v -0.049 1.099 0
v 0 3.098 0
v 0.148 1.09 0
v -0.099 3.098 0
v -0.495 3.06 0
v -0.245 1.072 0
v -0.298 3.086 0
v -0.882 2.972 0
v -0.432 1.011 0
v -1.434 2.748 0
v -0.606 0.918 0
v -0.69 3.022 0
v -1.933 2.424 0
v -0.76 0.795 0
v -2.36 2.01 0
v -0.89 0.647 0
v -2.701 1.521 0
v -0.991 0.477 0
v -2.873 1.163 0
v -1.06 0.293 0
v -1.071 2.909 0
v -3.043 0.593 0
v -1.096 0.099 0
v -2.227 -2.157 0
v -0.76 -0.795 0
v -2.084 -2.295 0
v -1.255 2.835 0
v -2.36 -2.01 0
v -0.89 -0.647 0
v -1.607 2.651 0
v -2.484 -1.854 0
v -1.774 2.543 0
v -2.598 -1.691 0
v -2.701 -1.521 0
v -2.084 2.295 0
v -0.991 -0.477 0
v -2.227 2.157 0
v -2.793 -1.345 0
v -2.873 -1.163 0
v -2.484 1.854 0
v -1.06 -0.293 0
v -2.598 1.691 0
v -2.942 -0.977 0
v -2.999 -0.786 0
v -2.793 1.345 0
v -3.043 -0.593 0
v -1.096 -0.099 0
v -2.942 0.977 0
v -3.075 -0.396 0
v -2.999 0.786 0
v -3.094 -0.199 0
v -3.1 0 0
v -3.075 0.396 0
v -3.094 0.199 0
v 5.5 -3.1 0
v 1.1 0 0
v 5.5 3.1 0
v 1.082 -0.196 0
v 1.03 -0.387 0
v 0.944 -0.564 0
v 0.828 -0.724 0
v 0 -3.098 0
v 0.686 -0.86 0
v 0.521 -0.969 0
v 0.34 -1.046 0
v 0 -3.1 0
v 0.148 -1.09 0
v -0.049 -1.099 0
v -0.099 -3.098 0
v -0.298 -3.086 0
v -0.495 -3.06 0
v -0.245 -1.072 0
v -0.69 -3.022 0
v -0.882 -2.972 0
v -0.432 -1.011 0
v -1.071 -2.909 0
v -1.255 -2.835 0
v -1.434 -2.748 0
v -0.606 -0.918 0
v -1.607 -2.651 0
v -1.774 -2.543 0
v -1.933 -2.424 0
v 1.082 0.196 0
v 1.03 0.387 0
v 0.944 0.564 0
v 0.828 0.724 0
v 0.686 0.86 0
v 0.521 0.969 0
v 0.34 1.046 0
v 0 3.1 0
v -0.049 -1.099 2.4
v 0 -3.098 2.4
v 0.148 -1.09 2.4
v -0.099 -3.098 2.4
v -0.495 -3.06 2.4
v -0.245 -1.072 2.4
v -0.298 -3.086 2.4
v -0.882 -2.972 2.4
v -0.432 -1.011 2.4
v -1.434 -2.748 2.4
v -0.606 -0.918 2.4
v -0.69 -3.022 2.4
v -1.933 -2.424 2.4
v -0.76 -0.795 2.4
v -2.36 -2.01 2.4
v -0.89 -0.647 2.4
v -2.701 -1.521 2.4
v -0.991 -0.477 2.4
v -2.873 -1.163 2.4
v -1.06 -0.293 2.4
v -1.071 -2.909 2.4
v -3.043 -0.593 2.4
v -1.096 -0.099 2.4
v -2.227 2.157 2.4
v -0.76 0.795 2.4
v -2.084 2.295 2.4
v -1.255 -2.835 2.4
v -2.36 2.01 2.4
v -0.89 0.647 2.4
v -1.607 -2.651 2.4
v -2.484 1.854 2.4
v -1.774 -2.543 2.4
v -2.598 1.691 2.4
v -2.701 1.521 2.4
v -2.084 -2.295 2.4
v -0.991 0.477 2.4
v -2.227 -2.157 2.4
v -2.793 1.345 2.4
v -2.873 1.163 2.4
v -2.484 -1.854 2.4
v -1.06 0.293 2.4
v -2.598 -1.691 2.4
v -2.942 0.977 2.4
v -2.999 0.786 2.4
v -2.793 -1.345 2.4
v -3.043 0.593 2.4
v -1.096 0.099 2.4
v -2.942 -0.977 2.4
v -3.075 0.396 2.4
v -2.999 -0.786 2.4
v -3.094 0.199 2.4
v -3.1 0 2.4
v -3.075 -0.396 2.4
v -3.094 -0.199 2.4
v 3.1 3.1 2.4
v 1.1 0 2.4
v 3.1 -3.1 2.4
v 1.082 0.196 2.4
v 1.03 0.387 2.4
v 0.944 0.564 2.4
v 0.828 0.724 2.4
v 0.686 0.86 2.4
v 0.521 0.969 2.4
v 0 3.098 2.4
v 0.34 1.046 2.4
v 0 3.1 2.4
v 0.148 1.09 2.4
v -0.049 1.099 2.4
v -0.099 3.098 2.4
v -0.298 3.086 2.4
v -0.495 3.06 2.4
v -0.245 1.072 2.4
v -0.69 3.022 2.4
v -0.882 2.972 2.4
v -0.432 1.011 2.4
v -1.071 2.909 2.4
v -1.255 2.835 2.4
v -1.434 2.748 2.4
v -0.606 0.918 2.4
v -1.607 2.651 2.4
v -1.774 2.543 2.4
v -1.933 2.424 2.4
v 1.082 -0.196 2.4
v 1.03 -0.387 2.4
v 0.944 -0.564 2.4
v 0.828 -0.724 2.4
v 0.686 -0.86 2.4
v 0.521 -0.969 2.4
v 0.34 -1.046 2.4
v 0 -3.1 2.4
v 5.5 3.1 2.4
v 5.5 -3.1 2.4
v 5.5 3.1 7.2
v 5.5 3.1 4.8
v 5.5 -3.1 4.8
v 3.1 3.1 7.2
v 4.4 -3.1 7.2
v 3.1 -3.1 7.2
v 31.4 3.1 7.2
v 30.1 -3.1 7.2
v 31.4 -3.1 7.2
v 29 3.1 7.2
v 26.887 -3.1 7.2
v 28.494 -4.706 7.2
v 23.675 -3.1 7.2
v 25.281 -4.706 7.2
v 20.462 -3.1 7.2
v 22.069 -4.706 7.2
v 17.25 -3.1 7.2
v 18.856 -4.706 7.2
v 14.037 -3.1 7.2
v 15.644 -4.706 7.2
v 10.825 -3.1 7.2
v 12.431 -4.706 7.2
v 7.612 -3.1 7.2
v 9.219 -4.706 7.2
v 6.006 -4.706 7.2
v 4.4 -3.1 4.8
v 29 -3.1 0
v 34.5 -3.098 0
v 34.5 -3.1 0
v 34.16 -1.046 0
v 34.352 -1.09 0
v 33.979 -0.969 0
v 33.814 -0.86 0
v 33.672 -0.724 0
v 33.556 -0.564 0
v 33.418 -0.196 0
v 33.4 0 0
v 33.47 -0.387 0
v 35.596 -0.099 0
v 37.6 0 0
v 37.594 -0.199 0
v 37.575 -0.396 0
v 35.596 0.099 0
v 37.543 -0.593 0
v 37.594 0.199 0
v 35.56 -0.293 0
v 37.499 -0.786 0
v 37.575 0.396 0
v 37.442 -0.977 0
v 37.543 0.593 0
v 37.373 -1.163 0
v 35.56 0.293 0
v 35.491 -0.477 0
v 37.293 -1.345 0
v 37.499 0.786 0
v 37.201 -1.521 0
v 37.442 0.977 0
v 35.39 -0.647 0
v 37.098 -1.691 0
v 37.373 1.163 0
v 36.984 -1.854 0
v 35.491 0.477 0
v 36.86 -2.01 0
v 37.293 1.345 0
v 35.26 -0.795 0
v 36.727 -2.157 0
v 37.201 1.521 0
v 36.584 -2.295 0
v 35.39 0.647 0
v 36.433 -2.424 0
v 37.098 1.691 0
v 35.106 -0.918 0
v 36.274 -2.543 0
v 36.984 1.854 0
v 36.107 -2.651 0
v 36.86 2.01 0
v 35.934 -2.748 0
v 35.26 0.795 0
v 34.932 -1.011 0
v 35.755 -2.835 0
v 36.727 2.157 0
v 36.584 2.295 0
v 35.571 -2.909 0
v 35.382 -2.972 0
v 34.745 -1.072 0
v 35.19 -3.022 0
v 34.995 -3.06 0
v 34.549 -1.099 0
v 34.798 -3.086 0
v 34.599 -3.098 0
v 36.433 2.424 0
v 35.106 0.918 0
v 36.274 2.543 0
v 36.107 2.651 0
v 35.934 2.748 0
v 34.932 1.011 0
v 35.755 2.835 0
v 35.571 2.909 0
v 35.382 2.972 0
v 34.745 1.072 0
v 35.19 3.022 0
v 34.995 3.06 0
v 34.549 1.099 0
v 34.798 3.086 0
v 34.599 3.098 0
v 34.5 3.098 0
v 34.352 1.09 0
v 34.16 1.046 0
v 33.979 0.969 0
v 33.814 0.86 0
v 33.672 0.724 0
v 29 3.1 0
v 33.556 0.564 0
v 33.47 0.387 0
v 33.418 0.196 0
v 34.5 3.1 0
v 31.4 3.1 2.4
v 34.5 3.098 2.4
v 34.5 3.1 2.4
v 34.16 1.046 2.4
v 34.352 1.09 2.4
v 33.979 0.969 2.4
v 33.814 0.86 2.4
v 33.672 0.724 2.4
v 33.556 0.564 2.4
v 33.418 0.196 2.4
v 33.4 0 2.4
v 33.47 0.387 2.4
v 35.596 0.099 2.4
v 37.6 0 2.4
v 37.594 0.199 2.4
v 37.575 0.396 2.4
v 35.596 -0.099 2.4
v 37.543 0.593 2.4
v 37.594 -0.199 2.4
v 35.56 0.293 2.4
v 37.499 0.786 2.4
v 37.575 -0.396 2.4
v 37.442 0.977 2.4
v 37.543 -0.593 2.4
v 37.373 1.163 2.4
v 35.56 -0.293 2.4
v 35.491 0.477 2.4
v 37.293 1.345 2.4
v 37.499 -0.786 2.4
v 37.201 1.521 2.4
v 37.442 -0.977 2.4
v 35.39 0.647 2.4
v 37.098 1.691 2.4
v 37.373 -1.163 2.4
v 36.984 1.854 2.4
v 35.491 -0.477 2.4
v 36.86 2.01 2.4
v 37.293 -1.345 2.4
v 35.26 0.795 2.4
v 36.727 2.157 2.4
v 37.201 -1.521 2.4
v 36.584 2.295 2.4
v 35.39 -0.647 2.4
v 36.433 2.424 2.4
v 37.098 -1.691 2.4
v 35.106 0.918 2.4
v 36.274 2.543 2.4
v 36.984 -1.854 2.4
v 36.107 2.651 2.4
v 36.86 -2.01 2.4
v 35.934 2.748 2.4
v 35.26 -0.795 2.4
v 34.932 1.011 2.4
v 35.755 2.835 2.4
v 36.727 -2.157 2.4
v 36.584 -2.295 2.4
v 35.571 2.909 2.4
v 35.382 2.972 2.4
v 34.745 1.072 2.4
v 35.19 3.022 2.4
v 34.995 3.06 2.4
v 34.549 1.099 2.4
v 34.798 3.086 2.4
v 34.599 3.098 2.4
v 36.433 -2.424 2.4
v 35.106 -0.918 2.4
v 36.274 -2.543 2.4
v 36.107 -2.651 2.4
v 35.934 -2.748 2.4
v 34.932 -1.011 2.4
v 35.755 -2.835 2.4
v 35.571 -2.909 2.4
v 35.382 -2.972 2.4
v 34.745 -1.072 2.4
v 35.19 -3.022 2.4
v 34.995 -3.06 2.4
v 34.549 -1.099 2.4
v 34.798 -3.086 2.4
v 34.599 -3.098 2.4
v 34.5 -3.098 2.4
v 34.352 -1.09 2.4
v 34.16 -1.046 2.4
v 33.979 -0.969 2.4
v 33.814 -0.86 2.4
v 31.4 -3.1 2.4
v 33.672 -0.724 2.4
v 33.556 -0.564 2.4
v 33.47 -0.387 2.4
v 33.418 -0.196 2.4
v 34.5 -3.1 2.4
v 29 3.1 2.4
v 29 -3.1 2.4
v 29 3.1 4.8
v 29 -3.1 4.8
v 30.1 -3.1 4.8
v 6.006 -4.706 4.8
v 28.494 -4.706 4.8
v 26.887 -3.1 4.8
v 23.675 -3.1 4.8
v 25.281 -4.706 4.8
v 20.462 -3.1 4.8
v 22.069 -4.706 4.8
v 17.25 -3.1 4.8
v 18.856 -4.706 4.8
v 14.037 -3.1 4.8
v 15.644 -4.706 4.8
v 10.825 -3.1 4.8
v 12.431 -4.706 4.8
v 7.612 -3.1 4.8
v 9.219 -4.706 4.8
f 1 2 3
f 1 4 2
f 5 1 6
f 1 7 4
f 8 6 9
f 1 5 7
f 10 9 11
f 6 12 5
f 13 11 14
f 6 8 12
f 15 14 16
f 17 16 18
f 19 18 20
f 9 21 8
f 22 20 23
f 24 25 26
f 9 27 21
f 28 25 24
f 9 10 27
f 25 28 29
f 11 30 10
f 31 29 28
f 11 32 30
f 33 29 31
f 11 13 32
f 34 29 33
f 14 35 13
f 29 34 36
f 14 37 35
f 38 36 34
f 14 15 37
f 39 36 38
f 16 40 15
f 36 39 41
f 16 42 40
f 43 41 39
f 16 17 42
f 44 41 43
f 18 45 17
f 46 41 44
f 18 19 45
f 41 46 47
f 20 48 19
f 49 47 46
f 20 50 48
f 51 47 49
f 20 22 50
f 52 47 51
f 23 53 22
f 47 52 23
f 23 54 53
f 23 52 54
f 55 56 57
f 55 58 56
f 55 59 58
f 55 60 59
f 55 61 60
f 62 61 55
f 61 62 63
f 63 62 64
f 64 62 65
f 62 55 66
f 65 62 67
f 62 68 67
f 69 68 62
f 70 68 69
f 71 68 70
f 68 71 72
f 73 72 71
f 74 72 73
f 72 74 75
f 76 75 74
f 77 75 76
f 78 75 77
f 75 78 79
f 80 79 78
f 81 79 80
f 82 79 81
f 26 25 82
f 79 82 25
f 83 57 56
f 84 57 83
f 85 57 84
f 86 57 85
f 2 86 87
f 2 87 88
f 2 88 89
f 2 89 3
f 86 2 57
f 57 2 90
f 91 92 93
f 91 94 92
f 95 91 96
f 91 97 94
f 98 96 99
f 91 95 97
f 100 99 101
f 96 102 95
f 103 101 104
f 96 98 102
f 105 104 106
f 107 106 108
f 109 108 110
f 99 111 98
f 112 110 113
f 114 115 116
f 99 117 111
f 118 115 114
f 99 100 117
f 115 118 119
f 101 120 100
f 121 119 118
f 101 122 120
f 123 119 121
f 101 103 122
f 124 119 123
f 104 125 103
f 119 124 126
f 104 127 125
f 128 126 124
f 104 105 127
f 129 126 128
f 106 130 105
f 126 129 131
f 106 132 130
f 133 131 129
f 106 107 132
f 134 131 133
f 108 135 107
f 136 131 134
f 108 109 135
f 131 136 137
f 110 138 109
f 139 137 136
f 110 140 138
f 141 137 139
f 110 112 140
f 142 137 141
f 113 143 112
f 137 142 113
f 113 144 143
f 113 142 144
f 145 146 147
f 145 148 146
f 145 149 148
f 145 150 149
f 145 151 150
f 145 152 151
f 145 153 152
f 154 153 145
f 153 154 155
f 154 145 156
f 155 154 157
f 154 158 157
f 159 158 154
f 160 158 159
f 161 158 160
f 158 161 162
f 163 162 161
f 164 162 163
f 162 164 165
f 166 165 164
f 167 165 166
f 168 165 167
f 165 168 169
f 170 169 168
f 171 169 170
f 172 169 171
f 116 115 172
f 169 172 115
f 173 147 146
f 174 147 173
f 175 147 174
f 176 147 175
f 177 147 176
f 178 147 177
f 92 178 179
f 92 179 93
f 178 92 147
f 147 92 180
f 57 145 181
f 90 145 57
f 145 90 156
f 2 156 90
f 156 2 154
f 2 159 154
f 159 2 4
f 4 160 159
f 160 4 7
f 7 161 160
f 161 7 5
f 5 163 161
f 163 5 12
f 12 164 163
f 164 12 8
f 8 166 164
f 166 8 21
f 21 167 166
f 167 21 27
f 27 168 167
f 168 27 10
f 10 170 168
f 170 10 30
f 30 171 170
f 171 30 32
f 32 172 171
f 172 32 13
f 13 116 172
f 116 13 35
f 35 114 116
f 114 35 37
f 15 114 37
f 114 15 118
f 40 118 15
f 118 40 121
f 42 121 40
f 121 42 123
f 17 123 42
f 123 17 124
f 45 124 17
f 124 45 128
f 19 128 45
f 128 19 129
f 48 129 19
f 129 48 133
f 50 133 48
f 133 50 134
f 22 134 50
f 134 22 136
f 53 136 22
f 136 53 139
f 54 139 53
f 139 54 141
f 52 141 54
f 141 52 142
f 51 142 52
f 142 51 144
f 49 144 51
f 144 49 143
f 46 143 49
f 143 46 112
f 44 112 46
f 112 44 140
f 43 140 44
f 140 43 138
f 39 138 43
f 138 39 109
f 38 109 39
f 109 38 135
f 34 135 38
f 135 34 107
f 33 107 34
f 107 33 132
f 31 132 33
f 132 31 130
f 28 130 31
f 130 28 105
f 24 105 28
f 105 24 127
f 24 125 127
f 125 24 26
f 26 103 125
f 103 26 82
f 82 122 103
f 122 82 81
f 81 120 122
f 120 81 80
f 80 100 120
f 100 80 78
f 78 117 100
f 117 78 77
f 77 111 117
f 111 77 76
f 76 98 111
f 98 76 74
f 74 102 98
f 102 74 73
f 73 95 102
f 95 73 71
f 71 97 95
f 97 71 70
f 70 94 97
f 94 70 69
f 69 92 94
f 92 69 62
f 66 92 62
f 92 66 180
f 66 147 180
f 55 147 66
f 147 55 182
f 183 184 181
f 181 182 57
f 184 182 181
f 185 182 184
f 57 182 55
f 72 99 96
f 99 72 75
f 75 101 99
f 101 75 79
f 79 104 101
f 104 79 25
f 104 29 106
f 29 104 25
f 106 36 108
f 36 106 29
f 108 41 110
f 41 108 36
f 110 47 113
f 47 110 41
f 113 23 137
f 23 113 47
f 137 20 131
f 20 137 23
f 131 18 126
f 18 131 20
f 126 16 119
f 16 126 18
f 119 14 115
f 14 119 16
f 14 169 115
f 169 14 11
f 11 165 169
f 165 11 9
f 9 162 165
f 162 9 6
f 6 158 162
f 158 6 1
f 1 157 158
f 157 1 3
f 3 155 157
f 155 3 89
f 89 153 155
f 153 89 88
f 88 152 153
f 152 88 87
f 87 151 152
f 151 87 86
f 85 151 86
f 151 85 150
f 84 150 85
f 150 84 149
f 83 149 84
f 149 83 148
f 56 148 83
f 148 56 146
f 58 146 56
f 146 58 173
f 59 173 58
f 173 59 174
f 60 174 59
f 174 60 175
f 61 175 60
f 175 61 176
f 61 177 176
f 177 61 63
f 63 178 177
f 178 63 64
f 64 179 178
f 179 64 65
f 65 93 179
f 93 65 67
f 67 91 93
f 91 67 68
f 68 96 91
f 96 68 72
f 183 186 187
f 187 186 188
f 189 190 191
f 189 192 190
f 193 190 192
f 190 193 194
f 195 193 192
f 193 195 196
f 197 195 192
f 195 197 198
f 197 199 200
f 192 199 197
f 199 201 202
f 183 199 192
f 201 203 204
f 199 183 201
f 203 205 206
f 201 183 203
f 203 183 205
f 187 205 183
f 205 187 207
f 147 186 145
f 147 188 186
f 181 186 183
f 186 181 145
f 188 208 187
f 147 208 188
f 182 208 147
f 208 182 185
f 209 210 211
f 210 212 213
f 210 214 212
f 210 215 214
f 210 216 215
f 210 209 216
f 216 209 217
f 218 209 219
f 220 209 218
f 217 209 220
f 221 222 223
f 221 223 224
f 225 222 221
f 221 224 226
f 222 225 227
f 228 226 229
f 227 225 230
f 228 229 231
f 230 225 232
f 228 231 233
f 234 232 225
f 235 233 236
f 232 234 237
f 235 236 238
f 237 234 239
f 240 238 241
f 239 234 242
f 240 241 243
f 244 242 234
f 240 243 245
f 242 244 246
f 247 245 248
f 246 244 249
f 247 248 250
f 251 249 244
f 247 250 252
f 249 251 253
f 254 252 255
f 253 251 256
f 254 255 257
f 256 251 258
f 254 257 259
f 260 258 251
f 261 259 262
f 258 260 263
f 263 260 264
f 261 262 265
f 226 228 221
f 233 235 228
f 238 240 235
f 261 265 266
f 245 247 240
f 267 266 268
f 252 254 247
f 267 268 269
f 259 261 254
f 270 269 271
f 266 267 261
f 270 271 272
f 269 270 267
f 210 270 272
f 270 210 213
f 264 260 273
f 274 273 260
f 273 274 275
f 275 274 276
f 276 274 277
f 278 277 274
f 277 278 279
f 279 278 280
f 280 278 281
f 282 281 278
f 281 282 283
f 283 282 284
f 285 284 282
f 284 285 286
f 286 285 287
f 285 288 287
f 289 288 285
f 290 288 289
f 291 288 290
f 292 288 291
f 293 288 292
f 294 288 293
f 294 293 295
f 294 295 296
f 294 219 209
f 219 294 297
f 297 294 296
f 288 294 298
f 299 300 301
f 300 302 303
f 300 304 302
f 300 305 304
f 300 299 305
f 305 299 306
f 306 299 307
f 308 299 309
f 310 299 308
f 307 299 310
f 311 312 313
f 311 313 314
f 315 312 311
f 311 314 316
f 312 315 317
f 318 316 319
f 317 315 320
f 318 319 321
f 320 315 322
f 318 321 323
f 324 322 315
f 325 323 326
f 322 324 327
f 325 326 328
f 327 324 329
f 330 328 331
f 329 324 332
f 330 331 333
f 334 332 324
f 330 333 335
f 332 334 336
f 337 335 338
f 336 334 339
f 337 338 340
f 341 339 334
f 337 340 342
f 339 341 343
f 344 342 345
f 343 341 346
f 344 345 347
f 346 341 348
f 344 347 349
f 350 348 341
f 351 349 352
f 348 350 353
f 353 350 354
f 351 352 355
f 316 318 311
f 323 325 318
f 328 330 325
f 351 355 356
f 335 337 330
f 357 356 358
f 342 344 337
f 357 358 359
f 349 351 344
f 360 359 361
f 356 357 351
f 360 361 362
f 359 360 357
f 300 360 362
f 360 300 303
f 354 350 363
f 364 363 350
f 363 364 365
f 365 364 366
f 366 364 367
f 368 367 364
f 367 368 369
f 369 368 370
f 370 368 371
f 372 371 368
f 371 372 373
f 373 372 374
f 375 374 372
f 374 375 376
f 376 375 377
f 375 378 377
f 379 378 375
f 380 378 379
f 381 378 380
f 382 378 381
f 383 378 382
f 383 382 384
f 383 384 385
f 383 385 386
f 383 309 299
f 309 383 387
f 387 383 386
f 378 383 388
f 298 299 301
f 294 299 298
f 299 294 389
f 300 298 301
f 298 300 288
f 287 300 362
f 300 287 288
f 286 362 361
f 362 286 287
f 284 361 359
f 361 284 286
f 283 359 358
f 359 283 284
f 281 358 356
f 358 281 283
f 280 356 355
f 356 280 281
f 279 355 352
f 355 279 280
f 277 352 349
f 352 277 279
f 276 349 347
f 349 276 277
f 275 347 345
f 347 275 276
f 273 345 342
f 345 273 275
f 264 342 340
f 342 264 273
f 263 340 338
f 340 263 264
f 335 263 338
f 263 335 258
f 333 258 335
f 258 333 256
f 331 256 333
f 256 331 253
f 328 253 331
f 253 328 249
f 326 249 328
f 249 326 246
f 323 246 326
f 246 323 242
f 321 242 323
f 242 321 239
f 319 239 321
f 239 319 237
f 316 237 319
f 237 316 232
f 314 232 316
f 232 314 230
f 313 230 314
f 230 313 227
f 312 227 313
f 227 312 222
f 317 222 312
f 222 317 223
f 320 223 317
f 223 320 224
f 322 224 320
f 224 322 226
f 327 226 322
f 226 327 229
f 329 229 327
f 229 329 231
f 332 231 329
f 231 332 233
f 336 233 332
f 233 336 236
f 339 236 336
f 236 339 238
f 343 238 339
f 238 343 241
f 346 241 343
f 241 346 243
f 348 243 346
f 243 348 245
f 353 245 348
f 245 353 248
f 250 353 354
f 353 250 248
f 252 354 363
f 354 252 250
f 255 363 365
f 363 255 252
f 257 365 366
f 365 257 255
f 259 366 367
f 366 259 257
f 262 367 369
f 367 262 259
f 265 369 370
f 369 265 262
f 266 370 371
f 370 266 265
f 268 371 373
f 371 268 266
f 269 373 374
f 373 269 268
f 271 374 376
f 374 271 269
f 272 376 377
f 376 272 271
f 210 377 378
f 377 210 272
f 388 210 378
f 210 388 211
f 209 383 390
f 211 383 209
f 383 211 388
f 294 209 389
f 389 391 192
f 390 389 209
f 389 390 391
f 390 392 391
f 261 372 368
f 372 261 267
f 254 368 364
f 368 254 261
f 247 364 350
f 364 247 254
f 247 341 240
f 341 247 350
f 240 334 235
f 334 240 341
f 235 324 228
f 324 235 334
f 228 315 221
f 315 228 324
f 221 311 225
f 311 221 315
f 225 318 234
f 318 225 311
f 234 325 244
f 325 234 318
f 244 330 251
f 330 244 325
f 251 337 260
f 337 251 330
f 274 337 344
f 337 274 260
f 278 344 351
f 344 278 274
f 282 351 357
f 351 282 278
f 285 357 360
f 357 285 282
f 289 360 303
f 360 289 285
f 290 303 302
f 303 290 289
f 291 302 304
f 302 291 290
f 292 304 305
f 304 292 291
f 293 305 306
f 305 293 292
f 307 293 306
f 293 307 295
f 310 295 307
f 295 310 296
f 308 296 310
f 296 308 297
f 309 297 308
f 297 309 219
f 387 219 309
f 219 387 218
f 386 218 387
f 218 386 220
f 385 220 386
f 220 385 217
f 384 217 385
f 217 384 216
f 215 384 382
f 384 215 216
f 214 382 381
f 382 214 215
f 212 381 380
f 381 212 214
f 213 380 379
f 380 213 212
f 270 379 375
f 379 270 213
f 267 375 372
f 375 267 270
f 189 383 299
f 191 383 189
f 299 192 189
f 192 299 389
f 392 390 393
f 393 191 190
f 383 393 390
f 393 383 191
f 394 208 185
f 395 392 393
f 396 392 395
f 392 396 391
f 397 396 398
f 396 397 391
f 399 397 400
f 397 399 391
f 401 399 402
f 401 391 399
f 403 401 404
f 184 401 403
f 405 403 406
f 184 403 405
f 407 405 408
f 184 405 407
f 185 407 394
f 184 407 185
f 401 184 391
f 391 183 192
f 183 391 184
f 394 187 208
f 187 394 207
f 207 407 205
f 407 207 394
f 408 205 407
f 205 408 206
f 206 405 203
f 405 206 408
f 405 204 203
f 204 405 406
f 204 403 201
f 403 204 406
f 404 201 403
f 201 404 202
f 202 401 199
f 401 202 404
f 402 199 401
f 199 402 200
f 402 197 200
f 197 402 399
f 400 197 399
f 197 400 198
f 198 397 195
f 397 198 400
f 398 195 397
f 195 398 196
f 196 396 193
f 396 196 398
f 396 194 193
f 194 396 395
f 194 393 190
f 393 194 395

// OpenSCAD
holeDistance = 34.5;
holeDiameter = 2.2;
holeMargin = 2;
thickness = 2.4;

wallOffset = 2.4;
teethCount = 8;

baseHeight = holeDiameter + 2 * holeMargin;
teethMargin = holeMargin + thickness;
teethWidth = holeDistance - 2 * teethMargin;
widthPerTooth = teethWidth / teethCount;
teethHeight = teethWidth / teethCount / 2;

$fa = $preview ? 0.5 : 0.2;
$fs = $preview ? 0.5 : 0.2;

module holder() {
    holeFrame();
    
    translate([holeDistance, 0, 0])
    scale([-1, 1, 1])
    holeFrame();
    
    translate([teethMargin, -baseHeight / 2, thickness + wallOffset])
    teeth();
}

module teeth() {
    teethNodes = [ each for (i = [0:teethCount-1]) [[i * widthPerTooth, 0], [(i + 0.5) * widthPerTooth, -teethHeight]] ];
    allNodes = [
        each teethNodes,
        [teethWidth, 0],
        [teethWidth, baseHeight],
        [0, baseHeight]
    ];
    
    linear_extrude(thickness)
    polygon(allNodes);
}

module holeFrame() {
    linear_extrude(thickness)
    difference() {
        union() {
            circle(d = baseHeight);
            
            translate([0, -baseHeight / 2])
            square([holeDiameter / 2 + teethMargin, baseHeight]);
        }
        
        circle(d = holeDiameter);
    }
    
    translate([holeDiameter / 2 + holeMargin, -baseHeight / 2, thickness])
    cube([thickness, baseHeight, wallOffset + thickness]);
}

holder();
